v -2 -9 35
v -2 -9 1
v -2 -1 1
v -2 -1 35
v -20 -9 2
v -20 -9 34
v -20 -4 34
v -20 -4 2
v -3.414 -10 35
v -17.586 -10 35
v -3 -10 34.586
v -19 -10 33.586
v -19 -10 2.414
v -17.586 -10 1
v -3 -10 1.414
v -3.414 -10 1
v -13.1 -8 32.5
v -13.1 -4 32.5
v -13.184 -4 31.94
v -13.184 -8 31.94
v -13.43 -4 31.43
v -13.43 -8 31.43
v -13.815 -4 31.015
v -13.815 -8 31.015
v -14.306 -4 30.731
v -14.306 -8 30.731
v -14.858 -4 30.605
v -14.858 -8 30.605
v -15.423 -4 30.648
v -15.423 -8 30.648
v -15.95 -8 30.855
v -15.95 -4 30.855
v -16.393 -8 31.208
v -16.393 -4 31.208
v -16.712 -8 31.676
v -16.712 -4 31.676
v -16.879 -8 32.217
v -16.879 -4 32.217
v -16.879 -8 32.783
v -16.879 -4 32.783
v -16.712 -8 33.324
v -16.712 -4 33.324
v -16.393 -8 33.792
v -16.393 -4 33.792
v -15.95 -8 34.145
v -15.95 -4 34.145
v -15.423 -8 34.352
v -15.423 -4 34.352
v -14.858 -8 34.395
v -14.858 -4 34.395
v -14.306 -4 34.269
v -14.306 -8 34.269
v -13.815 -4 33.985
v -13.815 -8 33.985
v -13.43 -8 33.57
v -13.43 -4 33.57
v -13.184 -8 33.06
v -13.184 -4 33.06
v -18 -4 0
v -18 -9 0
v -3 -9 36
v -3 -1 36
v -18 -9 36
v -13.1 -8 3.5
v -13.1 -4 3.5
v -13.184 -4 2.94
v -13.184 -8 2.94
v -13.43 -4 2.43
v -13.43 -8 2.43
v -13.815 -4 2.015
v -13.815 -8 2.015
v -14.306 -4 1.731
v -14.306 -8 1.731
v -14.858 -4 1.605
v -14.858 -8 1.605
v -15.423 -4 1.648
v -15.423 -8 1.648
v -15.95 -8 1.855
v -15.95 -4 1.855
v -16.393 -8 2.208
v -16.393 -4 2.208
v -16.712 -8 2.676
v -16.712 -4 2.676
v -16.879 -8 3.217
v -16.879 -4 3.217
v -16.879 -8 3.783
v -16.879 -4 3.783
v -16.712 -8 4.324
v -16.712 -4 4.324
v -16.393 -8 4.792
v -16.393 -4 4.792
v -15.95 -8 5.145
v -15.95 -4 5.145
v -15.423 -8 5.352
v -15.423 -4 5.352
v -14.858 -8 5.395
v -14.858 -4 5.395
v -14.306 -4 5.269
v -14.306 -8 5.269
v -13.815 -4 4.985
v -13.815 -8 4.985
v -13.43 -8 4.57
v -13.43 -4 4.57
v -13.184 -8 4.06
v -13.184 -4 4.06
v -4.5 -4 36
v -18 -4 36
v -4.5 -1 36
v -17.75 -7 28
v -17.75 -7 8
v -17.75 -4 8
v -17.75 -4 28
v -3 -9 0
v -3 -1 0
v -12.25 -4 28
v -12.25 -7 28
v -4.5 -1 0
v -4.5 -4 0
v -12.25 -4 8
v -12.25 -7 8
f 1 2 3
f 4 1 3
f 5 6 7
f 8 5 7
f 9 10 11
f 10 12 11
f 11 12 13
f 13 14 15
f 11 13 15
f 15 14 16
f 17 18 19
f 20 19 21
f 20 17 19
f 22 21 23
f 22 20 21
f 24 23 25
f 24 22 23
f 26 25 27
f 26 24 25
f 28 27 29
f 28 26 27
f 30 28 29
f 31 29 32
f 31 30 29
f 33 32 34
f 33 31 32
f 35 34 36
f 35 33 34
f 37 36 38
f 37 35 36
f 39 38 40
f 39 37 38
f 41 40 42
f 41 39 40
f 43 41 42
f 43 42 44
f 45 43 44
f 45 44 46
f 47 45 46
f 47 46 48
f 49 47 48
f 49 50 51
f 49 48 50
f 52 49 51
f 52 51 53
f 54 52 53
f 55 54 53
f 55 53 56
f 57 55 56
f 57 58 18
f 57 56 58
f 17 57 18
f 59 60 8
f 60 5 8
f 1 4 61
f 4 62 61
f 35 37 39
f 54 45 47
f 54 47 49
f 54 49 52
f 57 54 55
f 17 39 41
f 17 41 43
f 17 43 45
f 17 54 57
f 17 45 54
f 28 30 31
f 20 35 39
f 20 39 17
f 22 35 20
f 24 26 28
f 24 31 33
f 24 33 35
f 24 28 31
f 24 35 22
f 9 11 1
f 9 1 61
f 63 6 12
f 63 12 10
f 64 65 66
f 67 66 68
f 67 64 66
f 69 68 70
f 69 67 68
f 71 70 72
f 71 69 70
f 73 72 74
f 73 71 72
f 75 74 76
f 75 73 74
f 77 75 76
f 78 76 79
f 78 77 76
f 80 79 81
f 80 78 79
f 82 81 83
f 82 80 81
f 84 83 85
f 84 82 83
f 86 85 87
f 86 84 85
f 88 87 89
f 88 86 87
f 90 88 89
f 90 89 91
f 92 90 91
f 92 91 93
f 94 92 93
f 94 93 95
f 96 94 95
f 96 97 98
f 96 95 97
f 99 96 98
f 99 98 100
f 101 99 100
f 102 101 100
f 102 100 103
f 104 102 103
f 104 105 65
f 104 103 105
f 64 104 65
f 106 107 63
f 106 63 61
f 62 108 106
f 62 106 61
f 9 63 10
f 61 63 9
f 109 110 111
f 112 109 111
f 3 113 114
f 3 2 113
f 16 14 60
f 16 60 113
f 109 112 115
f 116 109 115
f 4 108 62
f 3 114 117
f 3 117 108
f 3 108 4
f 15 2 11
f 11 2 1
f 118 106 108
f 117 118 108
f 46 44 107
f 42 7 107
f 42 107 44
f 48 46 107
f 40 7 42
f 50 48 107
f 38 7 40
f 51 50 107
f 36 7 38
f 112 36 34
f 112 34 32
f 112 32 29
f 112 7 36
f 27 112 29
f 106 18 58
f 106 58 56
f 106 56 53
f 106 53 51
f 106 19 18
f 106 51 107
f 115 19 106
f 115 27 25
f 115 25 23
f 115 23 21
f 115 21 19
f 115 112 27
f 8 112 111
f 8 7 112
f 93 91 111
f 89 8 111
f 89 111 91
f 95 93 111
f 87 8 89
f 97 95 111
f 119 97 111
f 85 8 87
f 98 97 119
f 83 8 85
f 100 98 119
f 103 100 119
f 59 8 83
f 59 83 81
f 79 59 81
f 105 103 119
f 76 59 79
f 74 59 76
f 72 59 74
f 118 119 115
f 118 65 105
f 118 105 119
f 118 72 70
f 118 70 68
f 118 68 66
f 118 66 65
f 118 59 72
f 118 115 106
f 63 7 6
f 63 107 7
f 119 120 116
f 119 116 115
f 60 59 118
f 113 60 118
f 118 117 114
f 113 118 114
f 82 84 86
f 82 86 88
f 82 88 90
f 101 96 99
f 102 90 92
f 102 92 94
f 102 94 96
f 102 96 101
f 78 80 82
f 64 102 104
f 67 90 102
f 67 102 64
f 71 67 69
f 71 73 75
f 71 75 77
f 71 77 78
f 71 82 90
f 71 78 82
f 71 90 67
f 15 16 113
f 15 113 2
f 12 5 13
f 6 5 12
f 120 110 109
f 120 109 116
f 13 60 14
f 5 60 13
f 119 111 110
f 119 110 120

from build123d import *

# Parameters (mm, degrees)
BOX034_W                             = 5.5
BOX034_H                             = 3
BOX034_DEPTH                         = 20
CYLINDER016033_R                     = 1.9
CYLINDER016033_DEPTH                 = 10
CYLINDER016032_R                     = 1.9
CYLINDER016032_DEPTH                 = 10
BOX020_W                             = 14
BOX020_H                             = 9
BOX020_DEPTH                         = 40
BOX019_W                             = 14
BOX019_H                             = 9
BOX019_DEPTH                         = 40
BOX036_W                             = 25.5
BOX036_H                             = 3
BOX036_DEPTH                         = 36
BOX035_W                             = 40
BOX035_H                             = 9
BOX035_DEPTH                         = 36
CHAMFER016016008004017002013003_SIZE = 2
CHAMFER016016008004017002013004_SIZE = 1
CHAMFER016016008004017002013005_SIZE = 1


with BuildPart() as cube034:
    # Box034 → Box034 (new body)
    with BuildSketch(Plane(origin=(-17.75, -7, 8), x_dir=(1, 0, 0), z_dir=(0, 0, 1))):
        with Locations((2.75, 1.5)):
            Rectangle(BOX034_W, BOX034_H)
    extrude(amount=BOX034_DEPTH)


with BuildPart() as cylinder047:
    # Cylinder016033 → Cylinder016033 (new body)
    with BuildSketch(Plane(origin=(-15, 0, 3.5), x_dir=(1, 0, 0), z_dir=(0, 1, 0))):
        Circle(CYLINDER016033_R)
    extrude(amount=CYLINDER016033_DEPTH)


with BuildPart() as fusion018007003008:
    # Cylinder016032 → Cylinder016032 (new body)
    with BuildSketch(Plane(origin=(-15, 0, 32.5), x_dir=(1, 0, 0), z_dir=(0, 1, 0))):
        Circle(CYLINDER016032_R)
    extrude(amount=CYLINDER016032_DEPTH)

    # Fusion018007003008: union Cylinder047
    add(cylinder047.part)


with BuildPart() as fusion018007003008_1:
    # Fusion018007003008 placement: moved
    add(fusion018007003008.part.moved(Location((0, -8, 0))))


with BuildPart() as cube020:
    # Box020 → Box020 (new body)
    with BuildSketch(Plane(origin=(-34, -10, 0), x_dir=(1, 0, 0), z_dir=(0, 0, 1))):
        with Locations((7, 4.5)):
            Rectangle(BOX020_W, BOX020_H)
    extrude(amount=BOX020_DEPTH)


with BuildPart() as cube019:
    # Box019 → Box019 (new body)
    with BuildSketch(Plane(origin=(-2, -10, 0), x_dir=(1, 0, 0), z_dir=(0, 0, 1))):
        with Locations((7, 4.5)):
            Rectangle(BOX019_W, BOX019_H)
    extrude(amount=BOX019_DEPTH)


with BuildPart() as cube036:
    # Box036 → Box036 (new body)
    with BuildSketch(Plane(origin=(-30, -4, 0), x_dir=(1, 0, 0), z_dir=(0, 0, 1))):
        with Locations((12.75, 1.5)):
            Rectangle(BOX036_W, BOX036_H)
    extrude(amount=BOX036_DEPTH)


with BuildPart() as dock_magnet_mounter:
    # Box035 → Box035 (new body)
    with BuildSketch(Plane(origin=(-30, -10, 0), x_dir=(1, 0, 0), z_dir=(0, 0, 1))):
        with Locations((20, 4.5)):
            Rectangle(BOX035_W, BOX035_H)
    extrude(amount=BOX035_DEPTH)

    # Cut010011008009003016003: cut Cube036
    add(cube036.part, mode=Mode.SUBTRACT)

    # Cut010011008009003016004: cut Cube019
    add(cube019.part, mode=Mode.SUBTRACT)

    # Cut010011008009003016022: cut Cube020
    add(cube020.part, mode=Mode.SUBTRACT)

    # Chamfer016016008004017002013003
    chamfer016016008004017002013003_edges = [dock_magnet_mounter.edges().sort_by_distance(p)[0] for p in [
        (-20, -7, 36),
        (-20, -7, 0),
    ]]
    chamfer(chamfer016016008004017002013003_edges, length=CHAMFER016016008004017002013003_SIZE)

    # Chamfer016016008004017002013004
    chamfer016016008004017002013004_edges = [dock_magnet_mounter.edges().sort_by_distance(p)[0] for p in [
        (-2, -5.5, 36),
        (-2, -5.5, 0),
    ]]
    chamfer(chamfer016016008004017002013004_edges, length=CHAMFER016016008004017002013004_SIZE)

    # Cut010011008009003016023: cut Fusion018007003008
    add(fusion018007003008_1.part, mode=Mode.SUBTRACT)

    # Cut010011008009003016024: cut Cube034
    add(cube034.part, mode=Mode.SUBTRACT)

    # Chamfer016016008004017002013005
    chamfer016016008004017002013005_edges = [dock_magnet_mounter.edges().sort_by_distance(p)[0] for p in [
        (-10.5, -10, 36),
        (-10.5, -10, 0),
        (-19, -10, 1),
        (-20, -10, 18),
        (-19, -10, 35),
        (-2.5, -10, 35.5),
        (-2, -10, 18),
        (-2.5, -10, 0.5),
    ]]
    chamfer(chamfer016016008004017002013005_edges, length=CHAMFER016016008004017002013005_SIZE)


solid = dock_magnet_mounter.part
